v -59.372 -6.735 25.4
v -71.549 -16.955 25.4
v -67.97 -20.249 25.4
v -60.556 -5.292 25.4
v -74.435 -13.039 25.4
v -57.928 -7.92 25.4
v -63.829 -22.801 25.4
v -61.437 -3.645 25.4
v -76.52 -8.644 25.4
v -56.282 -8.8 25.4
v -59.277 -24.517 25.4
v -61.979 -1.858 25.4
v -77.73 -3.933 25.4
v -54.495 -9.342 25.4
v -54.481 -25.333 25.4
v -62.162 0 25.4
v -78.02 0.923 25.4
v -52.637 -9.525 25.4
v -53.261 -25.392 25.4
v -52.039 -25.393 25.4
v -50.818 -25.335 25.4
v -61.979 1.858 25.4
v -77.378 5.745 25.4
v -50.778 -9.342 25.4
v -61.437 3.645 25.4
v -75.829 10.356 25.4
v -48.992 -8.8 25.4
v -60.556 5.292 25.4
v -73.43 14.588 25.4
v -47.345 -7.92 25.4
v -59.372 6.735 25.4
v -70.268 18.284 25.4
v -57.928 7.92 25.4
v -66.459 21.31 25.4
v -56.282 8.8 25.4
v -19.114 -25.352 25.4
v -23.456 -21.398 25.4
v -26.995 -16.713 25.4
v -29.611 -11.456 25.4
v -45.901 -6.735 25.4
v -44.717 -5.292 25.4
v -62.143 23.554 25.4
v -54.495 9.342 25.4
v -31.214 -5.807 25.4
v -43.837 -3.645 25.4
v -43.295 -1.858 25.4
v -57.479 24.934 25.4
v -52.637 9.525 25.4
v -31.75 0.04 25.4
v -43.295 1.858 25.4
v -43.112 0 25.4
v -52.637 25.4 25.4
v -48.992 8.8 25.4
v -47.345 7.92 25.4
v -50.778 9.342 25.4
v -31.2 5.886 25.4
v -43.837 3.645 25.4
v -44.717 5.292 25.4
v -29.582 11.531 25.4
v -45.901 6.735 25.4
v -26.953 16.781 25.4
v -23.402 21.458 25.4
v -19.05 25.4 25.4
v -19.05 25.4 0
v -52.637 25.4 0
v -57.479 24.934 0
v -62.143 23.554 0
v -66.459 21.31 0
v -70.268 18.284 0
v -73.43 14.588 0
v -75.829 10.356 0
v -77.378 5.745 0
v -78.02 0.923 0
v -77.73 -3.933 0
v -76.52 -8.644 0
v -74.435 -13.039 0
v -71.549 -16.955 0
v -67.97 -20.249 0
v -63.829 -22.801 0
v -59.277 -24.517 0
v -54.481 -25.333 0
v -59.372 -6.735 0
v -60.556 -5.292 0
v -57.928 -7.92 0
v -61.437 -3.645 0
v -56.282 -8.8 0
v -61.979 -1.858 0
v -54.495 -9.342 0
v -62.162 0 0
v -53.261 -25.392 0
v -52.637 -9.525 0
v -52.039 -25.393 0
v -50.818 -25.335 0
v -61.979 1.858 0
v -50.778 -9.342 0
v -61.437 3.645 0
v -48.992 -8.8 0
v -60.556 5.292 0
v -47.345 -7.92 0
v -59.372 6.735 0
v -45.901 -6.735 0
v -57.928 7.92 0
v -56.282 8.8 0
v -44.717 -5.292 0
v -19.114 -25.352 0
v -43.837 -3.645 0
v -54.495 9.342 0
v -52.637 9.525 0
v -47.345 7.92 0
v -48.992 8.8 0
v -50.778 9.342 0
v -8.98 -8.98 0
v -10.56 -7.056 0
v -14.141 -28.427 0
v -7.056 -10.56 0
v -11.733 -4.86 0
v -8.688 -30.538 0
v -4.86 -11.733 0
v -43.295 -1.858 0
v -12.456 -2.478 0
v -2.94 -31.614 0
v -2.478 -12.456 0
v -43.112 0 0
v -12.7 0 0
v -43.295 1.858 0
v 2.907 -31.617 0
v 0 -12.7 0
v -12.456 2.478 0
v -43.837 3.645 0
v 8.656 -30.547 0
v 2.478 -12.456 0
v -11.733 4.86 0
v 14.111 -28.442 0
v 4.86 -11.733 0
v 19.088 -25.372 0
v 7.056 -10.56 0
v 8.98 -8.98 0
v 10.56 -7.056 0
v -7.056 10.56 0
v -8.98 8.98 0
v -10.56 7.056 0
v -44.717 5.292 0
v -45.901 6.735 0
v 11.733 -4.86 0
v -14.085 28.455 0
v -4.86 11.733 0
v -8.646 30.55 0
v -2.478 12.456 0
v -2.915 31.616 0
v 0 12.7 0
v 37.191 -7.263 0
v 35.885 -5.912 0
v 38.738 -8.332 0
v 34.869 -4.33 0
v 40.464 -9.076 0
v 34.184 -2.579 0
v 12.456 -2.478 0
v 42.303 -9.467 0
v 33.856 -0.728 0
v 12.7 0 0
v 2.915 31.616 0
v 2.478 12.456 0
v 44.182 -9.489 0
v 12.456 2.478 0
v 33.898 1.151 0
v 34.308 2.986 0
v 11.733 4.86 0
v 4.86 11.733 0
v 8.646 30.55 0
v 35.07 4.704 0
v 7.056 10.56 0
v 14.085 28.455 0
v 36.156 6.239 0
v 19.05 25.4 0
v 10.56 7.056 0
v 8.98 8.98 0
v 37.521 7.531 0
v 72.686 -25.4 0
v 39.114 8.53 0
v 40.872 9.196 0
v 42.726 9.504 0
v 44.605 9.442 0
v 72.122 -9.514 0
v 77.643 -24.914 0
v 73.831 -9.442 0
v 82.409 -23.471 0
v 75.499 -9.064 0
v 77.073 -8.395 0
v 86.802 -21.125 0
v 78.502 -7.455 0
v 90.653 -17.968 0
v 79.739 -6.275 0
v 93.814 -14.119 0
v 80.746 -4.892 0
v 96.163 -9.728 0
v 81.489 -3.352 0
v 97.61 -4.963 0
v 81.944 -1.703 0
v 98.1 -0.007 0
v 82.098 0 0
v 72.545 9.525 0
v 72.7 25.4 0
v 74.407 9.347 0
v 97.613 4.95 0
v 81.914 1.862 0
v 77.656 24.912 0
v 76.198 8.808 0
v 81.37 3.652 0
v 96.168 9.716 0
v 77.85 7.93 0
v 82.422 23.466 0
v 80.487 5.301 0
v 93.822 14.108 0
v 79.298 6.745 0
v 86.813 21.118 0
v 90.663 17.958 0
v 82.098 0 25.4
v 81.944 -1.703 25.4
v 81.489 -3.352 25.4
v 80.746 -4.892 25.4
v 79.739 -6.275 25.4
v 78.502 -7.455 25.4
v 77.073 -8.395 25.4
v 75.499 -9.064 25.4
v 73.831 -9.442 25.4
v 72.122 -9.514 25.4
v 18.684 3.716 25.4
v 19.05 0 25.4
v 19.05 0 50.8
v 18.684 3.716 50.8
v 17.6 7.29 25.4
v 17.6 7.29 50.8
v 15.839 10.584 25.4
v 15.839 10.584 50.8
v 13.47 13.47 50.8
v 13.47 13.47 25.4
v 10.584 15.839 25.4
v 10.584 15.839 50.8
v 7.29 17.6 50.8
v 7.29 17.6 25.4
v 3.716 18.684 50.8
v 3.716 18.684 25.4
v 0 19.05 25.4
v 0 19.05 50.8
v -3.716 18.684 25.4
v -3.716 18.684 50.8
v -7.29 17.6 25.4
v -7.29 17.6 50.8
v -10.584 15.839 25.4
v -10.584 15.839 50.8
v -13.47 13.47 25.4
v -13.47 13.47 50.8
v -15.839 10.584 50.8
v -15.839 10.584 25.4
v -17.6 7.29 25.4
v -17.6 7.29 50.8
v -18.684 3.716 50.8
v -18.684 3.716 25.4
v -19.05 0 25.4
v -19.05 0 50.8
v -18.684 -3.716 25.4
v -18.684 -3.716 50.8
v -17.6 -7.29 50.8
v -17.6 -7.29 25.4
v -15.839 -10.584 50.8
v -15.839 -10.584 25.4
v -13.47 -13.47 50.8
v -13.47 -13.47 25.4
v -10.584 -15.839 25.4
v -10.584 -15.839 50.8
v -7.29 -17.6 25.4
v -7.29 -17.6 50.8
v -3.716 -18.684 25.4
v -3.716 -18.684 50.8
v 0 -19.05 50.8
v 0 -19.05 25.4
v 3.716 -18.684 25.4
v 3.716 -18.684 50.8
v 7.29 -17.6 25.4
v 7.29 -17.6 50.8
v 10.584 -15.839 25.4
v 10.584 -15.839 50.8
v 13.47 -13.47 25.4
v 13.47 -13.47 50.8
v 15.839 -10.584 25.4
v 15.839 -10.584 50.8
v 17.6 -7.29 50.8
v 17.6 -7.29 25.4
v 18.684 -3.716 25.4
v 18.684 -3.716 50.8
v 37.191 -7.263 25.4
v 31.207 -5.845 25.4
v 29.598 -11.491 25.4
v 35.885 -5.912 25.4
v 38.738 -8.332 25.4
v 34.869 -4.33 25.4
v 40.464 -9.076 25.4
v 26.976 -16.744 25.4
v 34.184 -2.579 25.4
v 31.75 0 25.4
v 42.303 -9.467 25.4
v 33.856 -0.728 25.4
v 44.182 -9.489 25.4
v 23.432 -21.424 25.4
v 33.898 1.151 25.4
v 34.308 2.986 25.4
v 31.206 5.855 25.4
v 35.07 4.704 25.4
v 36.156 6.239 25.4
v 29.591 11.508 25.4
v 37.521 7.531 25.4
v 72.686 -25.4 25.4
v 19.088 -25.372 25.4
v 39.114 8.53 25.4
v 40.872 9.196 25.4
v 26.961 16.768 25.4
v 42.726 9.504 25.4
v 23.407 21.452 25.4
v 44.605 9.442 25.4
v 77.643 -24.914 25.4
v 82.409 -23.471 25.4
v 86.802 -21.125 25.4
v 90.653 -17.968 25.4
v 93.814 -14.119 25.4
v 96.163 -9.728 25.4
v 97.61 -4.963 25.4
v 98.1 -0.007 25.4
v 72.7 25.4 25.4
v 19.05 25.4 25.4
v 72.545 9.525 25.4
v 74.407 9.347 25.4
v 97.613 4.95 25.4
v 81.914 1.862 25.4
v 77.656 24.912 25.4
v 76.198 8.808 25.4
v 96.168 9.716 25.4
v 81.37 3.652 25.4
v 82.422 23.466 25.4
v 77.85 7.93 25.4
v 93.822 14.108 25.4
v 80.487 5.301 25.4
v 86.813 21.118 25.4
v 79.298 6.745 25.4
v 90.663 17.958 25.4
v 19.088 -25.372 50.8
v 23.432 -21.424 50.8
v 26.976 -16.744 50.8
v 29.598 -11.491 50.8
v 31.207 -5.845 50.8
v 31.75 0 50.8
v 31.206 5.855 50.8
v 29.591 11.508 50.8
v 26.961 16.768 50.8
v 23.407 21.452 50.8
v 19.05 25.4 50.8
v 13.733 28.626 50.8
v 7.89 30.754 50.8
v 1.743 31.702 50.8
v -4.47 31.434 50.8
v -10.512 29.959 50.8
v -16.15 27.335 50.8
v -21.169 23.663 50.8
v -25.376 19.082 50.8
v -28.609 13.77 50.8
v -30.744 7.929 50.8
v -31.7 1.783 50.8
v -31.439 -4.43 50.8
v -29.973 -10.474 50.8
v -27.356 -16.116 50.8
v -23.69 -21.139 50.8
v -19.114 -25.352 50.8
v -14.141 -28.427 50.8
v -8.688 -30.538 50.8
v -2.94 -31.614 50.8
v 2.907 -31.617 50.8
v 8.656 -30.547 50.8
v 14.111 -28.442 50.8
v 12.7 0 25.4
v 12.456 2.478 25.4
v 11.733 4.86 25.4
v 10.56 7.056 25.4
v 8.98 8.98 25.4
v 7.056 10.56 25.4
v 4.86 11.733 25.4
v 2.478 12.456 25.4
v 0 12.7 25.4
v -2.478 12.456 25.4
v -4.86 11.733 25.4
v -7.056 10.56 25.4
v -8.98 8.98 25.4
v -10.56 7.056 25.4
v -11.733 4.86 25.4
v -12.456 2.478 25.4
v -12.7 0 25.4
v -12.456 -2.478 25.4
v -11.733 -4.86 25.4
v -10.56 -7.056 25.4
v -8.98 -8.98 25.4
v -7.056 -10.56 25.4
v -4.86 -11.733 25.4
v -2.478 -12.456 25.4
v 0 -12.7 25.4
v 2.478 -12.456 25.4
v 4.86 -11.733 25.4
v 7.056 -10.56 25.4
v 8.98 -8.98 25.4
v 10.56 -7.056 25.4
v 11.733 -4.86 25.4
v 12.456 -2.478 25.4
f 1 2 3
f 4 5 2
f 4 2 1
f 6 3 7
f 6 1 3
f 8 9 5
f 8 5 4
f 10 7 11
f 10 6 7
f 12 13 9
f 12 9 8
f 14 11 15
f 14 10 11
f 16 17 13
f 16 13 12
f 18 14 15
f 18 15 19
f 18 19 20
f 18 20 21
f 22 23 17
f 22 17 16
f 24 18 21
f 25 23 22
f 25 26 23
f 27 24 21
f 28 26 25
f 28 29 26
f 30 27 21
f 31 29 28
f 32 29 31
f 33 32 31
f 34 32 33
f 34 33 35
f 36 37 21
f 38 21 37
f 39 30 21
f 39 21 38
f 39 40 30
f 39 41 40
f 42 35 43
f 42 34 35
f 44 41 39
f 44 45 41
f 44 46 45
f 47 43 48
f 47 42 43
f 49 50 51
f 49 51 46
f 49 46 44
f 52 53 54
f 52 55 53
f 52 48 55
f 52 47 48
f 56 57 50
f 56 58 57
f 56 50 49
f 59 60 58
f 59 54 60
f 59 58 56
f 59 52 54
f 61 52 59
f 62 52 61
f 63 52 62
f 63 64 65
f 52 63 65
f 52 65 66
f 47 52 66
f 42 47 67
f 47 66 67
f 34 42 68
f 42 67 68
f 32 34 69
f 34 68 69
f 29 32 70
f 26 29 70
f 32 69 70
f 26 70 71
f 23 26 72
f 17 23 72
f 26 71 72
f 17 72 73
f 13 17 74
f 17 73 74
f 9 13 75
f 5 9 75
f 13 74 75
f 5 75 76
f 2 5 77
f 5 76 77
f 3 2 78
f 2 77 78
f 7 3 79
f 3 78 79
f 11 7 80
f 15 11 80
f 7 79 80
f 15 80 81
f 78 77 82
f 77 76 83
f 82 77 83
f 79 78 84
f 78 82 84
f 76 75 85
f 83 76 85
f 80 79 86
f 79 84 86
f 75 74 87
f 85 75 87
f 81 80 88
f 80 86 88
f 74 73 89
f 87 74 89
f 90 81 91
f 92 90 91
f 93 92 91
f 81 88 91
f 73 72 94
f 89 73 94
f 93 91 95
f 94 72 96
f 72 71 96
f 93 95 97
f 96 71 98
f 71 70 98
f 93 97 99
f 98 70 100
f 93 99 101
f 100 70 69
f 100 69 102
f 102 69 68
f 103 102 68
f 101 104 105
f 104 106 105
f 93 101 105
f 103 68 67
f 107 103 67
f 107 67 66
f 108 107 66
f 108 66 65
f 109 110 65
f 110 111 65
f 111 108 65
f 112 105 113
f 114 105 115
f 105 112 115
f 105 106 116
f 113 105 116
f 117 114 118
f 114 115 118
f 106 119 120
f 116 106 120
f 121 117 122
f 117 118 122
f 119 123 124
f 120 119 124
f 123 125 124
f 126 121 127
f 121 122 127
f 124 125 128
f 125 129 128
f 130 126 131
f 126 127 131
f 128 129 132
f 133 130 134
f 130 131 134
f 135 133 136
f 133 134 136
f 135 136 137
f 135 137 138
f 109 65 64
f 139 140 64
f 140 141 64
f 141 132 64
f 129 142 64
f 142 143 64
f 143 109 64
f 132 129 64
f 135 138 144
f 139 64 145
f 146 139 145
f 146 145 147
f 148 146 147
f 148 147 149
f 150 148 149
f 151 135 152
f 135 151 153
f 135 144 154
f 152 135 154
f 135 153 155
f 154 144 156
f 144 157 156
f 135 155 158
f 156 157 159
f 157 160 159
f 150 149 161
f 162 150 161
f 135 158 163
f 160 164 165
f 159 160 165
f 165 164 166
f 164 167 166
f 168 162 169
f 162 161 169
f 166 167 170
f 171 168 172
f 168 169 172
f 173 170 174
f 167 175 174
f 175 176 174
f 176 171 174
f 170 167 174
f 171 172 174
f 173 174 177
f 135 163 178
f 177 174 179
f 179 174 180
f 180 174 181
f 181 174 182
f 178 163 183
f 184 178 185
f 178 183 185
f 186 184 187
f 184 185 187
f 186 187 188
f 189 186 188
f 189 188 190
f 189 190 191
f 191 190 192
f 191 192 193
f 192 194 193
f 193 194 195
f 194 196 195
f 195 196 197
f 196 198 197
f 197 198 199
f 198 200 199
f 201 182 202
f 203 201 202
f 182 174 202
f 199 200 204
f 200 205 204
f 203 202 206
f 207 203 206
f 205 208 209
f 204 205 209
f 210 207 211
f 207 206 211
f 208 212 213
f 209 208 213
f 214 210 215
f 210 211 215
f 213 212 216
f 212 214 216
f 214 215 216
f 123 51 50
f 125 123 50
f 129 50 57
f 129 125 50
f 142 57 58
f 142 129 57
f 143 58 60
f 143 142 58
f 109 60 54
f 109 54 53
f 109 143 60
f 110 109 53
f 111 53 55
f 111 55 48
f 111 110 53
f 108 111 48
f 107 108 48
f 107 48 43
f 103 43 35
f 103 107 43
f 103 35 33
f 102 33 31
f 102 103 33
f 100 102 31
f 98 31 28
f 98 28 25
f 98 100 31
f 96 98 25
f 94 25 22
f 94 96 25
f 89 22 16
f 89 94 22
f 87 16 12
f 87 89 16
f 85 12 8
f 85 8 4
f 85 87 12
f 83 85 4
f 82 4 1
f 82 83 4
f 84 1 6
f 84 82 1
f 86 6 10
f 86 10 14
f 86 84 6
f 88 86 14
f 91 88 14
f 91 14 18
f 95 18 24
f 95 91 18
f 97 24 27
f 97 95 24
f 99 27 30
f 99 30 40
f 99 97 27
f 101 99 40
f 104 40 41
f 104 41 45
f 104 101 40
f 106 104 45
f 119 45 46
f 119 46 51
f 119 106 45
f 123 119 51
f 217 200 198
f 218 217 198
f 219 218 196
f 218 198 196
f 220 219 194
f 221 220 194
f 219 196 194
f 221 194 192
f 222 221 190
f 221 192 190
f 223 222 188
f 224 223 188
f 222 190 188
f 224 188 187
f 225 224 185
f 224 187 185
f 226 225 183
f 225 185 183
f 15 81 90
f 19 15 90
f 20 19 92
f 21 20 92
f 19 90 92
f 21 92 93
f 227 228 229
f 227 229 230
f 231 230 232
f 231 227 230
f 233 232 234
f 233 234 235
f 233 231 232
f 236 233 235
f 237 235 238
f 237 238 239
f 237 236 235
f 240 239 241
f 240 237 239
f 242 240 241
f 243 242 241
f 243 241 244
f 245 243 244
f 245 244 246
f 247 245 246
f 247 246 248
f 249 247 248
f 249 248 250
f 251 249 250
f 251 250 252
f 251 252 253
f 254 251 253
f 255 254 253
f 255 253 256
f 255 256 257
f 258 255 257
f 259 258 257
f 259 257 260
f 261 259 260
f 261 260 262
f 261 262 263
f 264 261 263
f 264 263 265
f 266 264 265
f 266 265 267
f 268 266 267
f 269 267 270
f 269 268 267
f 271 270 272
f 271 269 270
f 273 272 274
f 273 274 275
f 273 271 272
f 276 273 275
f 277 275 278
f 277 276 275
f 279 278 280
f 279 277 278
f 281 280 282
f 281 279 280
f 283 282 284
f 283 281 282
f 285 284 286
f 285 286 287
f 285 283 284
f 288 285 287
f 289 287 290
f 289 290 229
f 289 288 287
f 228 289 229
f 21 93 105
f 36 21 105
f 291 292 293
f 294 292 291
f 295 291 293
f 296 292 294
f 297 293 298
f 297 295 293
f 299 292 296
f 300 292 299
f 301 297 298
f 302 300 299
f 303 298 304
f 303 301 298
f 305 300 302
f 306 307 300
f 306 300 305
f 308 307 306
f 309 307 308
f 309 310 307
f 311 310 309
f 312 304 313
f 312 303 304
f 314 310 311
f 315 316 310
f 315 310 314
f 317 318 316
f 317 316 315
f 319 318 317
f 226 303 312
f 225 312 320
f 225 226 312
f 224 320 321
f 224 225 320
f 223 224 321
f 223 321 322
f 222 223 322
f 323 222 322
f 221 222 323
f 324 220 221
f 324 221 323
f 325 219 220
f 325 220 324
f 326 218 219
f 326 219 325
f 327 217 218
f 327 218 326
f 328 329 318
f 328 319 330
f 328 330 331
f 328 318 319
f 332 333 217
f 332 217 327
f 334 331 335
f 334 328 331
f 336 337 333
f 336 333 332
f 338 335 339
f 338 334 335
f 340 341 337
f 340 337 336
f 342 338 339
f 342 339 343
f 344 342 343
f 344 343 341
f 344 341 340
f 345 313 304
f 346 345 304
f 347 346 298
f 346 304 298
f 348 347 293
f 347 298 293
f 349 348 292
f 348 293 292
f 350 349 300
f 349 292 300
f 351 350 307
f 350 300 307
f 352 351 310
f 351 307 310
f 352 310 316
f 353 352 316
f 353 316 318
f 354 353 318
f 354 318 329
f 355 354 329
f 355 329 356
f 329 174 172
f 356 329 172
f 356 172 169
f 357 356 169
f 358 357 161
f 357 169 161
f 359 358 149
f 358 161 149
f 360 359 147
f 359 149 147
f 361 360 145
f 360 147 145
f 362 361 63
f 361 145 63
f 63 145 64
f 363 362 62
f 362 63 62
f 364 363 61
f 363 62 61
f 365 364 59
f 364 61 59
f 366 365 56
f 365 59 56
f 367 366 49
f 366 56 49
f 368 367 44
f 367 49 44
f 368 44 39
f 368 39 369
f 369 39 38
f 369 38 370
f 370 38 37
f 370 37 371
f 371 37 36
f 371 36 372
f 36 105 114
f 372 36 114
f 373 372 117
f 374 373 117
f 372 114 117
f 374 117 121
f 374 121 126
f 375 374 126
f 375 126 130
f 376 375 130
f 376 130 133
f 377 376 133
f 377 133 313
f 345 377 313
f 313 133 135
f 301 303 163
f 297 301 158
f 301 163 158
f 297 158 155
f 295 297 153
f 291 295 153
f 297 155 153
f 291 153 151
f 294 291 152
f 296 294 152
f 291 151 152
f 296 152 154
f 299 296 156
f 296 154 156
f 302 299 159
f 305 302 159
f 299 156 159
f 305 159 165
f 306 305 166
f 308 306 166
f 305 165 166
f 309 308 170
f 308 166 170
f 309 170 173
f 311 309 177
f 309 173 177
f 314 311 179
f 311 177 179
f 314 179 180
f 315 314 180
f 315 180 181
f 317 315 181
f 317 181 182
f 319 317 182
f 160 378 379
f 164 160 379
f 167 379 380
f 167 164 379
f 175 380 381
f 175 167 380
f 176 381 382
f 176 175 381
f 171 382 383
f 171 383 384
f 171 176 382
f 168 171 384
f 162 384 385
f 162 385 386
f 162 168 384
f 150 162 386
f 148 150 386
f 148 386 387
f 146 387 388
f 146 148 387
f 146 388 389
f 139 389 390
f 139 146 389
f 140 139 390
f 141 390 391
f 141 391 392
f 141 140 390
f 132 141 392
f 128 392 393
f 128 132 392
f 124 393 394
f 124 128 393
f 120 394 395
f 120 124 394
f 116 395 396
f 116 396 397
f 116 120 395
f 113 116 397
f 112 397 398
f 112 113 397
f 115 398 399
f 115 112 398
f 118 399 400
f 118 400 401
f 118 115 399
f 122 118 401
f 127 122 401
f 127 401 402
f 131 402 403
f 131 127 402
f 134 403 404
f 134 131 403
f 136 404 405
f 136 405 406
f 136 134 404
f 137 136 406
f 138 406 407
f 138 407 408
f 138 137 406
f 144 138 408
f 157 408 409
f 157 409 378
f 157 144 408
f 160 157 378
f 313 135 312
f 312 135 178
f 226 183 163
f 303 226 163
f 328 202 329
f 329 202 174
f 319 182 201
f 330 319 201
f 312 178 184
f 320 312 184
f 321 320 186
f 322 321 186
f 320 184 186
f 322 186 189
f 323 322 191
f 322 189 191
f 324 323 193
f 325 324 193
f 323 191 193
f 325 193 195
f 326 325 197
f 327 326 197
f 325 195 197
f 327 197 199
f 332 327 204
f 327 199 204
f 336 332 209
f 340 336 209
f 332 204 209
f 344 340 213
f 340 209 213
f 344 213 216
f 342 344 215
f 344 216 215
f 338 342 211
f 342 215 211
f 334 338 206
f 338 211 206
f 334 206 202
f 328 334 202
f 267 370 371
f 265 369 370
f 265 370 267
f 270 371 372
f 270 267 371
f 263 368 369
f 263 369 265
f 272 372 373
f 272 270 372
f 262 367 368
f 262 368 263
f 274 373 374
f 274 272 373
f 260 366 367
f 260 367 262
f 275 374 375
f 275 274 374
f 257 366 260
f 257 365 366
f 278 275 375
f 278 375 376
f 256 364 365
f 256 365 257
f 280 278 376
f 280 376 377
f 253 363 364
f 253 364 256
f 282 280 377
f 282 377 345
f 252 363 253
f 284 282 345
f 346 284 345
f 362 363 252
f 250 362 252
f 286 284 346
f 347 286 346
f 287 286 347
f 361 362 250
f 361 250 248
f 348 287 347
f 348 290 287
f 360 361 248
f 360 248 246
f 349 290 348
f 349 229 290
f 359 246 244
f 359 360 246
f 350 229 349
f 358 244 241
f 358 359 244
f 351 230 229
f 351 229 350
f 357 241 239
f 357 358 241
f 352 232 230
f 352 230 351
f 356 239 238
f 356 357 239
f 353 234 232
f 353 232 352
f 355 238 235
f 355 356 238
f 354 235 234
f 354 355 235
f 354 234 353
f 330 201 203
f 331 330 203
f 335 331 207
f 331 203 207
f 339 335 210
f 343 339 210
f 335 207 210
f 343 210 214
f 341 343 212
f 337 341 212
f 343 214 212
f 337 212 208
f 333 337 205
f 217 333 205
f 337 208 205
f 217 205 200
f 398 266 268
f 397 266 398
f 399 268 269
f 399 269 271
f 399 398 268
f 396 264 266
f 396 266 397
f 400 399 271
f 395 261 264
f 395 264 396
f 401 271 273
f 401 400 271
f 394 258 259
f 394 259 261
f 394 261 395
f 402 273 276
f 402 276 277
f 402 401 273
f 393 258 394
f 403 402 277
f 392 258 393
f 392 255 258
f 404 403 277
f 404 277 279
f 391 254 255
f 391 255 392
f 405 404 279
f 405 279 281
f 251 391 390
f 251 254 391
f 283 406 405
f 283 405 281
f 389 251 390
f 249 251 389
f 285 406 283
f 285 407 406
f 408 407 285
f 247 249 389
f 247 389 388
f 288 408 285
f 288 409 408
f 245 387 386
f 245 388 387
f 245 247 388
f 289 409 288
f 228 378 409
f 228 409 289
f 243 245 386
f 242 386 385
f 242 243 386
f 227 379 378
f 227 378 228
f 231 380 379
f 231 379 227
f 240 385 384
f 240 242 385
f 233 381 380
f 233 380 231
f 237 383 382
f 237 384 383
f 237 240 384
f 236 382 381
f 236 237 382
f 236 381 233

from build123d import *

# Parameters (mm, degrees)
F0_R     = 9.525
F0_R_2   = 19.05
F1_DEPTH = 25.4
F2_DEPTH = 50.8
F0_R_3   = 12.7
F3_DEPTH = 25.4


with BuildPart() as f1:
    # F0 (on Top) → F1 (new body)
    with BuildSketch(Plane.XY):
        with BuildLine():
            Line((-19.05, 25.4), (19.05, 25.4))
            ThreePointArc((19.05, 25.4), (0, 31.75), (-19.05, 25.4))
        make_face()
        with BuildLine():
            ThreePointArc((-19.114402028, -25.3515706636), (-0.0167484131, -31.7499955825), (19.0876450268, -25.3717225929))
            Line((19.0876450268, -25.3717225929), (-19.114402028, -25.3515706636))
        make_face()
        with BuildLine():
            ThreePointArc((-54.4814434441, -25.3329142257), (-52.6499961562, -25.399996466), (-50.8184791146, -25.3348464729))
            Line((-50.8184791146, -25.3348464729), (-54.4814434441, -25.3329142257))
        make_face()
        with BuildLine():
            ThreePointArc((-19.114402028, -25.3515706636), (-31.7499744369, 0.0402896446), (-19.05, 25.4))
            Line((-19.05, 25.4), (-52.6365974257, 25.4))
            ThreePointArc((-52.6365974257, 25.4), (-78.0198204414, 0.9230326826), (-54.4814434441, -25.3329142257))
            Line((-54.4814434441, -25.3329142257), (-50.8184791146, -25.3348464729))
            Line((-50.8184791146, -25.3348464729), (-19.114402028, -25.3515706636))
        make_face()
        with Locations((-52.6365974257, 0)):
            Circle(F0_R, mode=Mode.SUBTRACT)
        with BuildLine():
            ThreePointArc((19.05, 25.4), (28.3980633142, 14.1990316571), (31.75, 0))
            ThreePointArc((31.75, 0), (28.4085834705, -14.1779718295), (19.0876450268, -25.3717225929))
            Line((19.0876450268, -25.3717225929), (72.6864750945, -25.399996466))
            ThreePointArc((72.6864750945, -25.399996466), (98.0998729414, -0.0066993655), (72.6998738249, 25.4))
            Line((72.6998738249, 25.4), (19.05, 25.4))
        make_face()
        with BuildLine():
            ThreePointArc((44.1823822002, -9.4888135551), (33.8302697715, 0.2125014193), (44.6048393131, 9.4423657283))
            Line((44.6048393131, 9.4423657283), (72.544717238, 9.5249583835))
            ThreePointArc((72.544717238, 9.5249583835), (79.2981036912, 6.7451396016), (82.0978738249, 0))
            ThreePointArc((82.0978738249, 0), (79.146859724, -6.8926289903), (72.1223705392, -9.5143403234))
            Line((72.1223705392, -9.5143403234), (44.1823822002, -9.4888135551))
        make_face(mode=Mode.SUBTRACT)
        with BuildLine():
            ThreePointArc((19.0876450268, -25.3717225929), (28.4085834705, -14.1779718295), (31.75, 0))
            ThreePointArc((31.75, 0), (28.3980633142, 14.1990316571), (19.05, 25.4))
            Line((19.05, 25.4), (-19.05, 25.4))
            ThreePointArc((-19.05, 25.4), (-31.7499744369, 0.0402896446), (-19.114402028, -25.3515706636))
            Line((-19.114402028, -25.3515706636), (19.0876450268, -25.3717225929))
        make_face()
        Circle(F0_R_2, mode=Mode.SUBTRACT)
    extrude(amount=F1_DEPTH)

    # F0 (on Top) → F2 (join)
    with BuildSketch(Plane.XY):
        with BuildLine():
            ThreePointArc((19.0876450268, -25.3717225929), (28.4085834705, -14.1779718295), (31.75, 0))
            ThreePointArc((31.75, 0), (28.3980633142, 14.1990316571), (19.05, 25.4))
            Line((19.05, 25.4), (-19.05, 25.4))
            ThreePointArc((-19.05, 25.4), (-31.7499744369, 0.0402896446), (-19.114402028, -25.3515706636))
            Line((-19.114402028, -25.3515706636), (19.0876450268, -25.3717225929))
        make_face()
        Circle(F0_R_2, mode=Mode.SUBTRACT)
        with BuildLine():
            ThreePointArc((-19.114402028, -25.3515706636), (-0.0167484131, -31.7499955825), (19.0876450268, -25.3717225929))
            Line((19.0876450268, -25.3717225929), (-19.114402028, -25.3515706636))
        make_face()
        with BuildLine():
            Line((-19.05, 25.4), (19.05, 25.4))
            ThreePointArc((19.05, 25.4), (0, 31.75), (-19.05, 25.4))
        make_face()
    extrude(amount=F2_DEPTH)

    # F0 (on Top) → F3 (join)
    with BuildSketch(Plane.XY):
        Circle(F0_R_2)
        Circle(F0_R_3, mode=Mode.SUBTRACT)
    extrude(amount=F3_DEPTH)


solid = f1.part
